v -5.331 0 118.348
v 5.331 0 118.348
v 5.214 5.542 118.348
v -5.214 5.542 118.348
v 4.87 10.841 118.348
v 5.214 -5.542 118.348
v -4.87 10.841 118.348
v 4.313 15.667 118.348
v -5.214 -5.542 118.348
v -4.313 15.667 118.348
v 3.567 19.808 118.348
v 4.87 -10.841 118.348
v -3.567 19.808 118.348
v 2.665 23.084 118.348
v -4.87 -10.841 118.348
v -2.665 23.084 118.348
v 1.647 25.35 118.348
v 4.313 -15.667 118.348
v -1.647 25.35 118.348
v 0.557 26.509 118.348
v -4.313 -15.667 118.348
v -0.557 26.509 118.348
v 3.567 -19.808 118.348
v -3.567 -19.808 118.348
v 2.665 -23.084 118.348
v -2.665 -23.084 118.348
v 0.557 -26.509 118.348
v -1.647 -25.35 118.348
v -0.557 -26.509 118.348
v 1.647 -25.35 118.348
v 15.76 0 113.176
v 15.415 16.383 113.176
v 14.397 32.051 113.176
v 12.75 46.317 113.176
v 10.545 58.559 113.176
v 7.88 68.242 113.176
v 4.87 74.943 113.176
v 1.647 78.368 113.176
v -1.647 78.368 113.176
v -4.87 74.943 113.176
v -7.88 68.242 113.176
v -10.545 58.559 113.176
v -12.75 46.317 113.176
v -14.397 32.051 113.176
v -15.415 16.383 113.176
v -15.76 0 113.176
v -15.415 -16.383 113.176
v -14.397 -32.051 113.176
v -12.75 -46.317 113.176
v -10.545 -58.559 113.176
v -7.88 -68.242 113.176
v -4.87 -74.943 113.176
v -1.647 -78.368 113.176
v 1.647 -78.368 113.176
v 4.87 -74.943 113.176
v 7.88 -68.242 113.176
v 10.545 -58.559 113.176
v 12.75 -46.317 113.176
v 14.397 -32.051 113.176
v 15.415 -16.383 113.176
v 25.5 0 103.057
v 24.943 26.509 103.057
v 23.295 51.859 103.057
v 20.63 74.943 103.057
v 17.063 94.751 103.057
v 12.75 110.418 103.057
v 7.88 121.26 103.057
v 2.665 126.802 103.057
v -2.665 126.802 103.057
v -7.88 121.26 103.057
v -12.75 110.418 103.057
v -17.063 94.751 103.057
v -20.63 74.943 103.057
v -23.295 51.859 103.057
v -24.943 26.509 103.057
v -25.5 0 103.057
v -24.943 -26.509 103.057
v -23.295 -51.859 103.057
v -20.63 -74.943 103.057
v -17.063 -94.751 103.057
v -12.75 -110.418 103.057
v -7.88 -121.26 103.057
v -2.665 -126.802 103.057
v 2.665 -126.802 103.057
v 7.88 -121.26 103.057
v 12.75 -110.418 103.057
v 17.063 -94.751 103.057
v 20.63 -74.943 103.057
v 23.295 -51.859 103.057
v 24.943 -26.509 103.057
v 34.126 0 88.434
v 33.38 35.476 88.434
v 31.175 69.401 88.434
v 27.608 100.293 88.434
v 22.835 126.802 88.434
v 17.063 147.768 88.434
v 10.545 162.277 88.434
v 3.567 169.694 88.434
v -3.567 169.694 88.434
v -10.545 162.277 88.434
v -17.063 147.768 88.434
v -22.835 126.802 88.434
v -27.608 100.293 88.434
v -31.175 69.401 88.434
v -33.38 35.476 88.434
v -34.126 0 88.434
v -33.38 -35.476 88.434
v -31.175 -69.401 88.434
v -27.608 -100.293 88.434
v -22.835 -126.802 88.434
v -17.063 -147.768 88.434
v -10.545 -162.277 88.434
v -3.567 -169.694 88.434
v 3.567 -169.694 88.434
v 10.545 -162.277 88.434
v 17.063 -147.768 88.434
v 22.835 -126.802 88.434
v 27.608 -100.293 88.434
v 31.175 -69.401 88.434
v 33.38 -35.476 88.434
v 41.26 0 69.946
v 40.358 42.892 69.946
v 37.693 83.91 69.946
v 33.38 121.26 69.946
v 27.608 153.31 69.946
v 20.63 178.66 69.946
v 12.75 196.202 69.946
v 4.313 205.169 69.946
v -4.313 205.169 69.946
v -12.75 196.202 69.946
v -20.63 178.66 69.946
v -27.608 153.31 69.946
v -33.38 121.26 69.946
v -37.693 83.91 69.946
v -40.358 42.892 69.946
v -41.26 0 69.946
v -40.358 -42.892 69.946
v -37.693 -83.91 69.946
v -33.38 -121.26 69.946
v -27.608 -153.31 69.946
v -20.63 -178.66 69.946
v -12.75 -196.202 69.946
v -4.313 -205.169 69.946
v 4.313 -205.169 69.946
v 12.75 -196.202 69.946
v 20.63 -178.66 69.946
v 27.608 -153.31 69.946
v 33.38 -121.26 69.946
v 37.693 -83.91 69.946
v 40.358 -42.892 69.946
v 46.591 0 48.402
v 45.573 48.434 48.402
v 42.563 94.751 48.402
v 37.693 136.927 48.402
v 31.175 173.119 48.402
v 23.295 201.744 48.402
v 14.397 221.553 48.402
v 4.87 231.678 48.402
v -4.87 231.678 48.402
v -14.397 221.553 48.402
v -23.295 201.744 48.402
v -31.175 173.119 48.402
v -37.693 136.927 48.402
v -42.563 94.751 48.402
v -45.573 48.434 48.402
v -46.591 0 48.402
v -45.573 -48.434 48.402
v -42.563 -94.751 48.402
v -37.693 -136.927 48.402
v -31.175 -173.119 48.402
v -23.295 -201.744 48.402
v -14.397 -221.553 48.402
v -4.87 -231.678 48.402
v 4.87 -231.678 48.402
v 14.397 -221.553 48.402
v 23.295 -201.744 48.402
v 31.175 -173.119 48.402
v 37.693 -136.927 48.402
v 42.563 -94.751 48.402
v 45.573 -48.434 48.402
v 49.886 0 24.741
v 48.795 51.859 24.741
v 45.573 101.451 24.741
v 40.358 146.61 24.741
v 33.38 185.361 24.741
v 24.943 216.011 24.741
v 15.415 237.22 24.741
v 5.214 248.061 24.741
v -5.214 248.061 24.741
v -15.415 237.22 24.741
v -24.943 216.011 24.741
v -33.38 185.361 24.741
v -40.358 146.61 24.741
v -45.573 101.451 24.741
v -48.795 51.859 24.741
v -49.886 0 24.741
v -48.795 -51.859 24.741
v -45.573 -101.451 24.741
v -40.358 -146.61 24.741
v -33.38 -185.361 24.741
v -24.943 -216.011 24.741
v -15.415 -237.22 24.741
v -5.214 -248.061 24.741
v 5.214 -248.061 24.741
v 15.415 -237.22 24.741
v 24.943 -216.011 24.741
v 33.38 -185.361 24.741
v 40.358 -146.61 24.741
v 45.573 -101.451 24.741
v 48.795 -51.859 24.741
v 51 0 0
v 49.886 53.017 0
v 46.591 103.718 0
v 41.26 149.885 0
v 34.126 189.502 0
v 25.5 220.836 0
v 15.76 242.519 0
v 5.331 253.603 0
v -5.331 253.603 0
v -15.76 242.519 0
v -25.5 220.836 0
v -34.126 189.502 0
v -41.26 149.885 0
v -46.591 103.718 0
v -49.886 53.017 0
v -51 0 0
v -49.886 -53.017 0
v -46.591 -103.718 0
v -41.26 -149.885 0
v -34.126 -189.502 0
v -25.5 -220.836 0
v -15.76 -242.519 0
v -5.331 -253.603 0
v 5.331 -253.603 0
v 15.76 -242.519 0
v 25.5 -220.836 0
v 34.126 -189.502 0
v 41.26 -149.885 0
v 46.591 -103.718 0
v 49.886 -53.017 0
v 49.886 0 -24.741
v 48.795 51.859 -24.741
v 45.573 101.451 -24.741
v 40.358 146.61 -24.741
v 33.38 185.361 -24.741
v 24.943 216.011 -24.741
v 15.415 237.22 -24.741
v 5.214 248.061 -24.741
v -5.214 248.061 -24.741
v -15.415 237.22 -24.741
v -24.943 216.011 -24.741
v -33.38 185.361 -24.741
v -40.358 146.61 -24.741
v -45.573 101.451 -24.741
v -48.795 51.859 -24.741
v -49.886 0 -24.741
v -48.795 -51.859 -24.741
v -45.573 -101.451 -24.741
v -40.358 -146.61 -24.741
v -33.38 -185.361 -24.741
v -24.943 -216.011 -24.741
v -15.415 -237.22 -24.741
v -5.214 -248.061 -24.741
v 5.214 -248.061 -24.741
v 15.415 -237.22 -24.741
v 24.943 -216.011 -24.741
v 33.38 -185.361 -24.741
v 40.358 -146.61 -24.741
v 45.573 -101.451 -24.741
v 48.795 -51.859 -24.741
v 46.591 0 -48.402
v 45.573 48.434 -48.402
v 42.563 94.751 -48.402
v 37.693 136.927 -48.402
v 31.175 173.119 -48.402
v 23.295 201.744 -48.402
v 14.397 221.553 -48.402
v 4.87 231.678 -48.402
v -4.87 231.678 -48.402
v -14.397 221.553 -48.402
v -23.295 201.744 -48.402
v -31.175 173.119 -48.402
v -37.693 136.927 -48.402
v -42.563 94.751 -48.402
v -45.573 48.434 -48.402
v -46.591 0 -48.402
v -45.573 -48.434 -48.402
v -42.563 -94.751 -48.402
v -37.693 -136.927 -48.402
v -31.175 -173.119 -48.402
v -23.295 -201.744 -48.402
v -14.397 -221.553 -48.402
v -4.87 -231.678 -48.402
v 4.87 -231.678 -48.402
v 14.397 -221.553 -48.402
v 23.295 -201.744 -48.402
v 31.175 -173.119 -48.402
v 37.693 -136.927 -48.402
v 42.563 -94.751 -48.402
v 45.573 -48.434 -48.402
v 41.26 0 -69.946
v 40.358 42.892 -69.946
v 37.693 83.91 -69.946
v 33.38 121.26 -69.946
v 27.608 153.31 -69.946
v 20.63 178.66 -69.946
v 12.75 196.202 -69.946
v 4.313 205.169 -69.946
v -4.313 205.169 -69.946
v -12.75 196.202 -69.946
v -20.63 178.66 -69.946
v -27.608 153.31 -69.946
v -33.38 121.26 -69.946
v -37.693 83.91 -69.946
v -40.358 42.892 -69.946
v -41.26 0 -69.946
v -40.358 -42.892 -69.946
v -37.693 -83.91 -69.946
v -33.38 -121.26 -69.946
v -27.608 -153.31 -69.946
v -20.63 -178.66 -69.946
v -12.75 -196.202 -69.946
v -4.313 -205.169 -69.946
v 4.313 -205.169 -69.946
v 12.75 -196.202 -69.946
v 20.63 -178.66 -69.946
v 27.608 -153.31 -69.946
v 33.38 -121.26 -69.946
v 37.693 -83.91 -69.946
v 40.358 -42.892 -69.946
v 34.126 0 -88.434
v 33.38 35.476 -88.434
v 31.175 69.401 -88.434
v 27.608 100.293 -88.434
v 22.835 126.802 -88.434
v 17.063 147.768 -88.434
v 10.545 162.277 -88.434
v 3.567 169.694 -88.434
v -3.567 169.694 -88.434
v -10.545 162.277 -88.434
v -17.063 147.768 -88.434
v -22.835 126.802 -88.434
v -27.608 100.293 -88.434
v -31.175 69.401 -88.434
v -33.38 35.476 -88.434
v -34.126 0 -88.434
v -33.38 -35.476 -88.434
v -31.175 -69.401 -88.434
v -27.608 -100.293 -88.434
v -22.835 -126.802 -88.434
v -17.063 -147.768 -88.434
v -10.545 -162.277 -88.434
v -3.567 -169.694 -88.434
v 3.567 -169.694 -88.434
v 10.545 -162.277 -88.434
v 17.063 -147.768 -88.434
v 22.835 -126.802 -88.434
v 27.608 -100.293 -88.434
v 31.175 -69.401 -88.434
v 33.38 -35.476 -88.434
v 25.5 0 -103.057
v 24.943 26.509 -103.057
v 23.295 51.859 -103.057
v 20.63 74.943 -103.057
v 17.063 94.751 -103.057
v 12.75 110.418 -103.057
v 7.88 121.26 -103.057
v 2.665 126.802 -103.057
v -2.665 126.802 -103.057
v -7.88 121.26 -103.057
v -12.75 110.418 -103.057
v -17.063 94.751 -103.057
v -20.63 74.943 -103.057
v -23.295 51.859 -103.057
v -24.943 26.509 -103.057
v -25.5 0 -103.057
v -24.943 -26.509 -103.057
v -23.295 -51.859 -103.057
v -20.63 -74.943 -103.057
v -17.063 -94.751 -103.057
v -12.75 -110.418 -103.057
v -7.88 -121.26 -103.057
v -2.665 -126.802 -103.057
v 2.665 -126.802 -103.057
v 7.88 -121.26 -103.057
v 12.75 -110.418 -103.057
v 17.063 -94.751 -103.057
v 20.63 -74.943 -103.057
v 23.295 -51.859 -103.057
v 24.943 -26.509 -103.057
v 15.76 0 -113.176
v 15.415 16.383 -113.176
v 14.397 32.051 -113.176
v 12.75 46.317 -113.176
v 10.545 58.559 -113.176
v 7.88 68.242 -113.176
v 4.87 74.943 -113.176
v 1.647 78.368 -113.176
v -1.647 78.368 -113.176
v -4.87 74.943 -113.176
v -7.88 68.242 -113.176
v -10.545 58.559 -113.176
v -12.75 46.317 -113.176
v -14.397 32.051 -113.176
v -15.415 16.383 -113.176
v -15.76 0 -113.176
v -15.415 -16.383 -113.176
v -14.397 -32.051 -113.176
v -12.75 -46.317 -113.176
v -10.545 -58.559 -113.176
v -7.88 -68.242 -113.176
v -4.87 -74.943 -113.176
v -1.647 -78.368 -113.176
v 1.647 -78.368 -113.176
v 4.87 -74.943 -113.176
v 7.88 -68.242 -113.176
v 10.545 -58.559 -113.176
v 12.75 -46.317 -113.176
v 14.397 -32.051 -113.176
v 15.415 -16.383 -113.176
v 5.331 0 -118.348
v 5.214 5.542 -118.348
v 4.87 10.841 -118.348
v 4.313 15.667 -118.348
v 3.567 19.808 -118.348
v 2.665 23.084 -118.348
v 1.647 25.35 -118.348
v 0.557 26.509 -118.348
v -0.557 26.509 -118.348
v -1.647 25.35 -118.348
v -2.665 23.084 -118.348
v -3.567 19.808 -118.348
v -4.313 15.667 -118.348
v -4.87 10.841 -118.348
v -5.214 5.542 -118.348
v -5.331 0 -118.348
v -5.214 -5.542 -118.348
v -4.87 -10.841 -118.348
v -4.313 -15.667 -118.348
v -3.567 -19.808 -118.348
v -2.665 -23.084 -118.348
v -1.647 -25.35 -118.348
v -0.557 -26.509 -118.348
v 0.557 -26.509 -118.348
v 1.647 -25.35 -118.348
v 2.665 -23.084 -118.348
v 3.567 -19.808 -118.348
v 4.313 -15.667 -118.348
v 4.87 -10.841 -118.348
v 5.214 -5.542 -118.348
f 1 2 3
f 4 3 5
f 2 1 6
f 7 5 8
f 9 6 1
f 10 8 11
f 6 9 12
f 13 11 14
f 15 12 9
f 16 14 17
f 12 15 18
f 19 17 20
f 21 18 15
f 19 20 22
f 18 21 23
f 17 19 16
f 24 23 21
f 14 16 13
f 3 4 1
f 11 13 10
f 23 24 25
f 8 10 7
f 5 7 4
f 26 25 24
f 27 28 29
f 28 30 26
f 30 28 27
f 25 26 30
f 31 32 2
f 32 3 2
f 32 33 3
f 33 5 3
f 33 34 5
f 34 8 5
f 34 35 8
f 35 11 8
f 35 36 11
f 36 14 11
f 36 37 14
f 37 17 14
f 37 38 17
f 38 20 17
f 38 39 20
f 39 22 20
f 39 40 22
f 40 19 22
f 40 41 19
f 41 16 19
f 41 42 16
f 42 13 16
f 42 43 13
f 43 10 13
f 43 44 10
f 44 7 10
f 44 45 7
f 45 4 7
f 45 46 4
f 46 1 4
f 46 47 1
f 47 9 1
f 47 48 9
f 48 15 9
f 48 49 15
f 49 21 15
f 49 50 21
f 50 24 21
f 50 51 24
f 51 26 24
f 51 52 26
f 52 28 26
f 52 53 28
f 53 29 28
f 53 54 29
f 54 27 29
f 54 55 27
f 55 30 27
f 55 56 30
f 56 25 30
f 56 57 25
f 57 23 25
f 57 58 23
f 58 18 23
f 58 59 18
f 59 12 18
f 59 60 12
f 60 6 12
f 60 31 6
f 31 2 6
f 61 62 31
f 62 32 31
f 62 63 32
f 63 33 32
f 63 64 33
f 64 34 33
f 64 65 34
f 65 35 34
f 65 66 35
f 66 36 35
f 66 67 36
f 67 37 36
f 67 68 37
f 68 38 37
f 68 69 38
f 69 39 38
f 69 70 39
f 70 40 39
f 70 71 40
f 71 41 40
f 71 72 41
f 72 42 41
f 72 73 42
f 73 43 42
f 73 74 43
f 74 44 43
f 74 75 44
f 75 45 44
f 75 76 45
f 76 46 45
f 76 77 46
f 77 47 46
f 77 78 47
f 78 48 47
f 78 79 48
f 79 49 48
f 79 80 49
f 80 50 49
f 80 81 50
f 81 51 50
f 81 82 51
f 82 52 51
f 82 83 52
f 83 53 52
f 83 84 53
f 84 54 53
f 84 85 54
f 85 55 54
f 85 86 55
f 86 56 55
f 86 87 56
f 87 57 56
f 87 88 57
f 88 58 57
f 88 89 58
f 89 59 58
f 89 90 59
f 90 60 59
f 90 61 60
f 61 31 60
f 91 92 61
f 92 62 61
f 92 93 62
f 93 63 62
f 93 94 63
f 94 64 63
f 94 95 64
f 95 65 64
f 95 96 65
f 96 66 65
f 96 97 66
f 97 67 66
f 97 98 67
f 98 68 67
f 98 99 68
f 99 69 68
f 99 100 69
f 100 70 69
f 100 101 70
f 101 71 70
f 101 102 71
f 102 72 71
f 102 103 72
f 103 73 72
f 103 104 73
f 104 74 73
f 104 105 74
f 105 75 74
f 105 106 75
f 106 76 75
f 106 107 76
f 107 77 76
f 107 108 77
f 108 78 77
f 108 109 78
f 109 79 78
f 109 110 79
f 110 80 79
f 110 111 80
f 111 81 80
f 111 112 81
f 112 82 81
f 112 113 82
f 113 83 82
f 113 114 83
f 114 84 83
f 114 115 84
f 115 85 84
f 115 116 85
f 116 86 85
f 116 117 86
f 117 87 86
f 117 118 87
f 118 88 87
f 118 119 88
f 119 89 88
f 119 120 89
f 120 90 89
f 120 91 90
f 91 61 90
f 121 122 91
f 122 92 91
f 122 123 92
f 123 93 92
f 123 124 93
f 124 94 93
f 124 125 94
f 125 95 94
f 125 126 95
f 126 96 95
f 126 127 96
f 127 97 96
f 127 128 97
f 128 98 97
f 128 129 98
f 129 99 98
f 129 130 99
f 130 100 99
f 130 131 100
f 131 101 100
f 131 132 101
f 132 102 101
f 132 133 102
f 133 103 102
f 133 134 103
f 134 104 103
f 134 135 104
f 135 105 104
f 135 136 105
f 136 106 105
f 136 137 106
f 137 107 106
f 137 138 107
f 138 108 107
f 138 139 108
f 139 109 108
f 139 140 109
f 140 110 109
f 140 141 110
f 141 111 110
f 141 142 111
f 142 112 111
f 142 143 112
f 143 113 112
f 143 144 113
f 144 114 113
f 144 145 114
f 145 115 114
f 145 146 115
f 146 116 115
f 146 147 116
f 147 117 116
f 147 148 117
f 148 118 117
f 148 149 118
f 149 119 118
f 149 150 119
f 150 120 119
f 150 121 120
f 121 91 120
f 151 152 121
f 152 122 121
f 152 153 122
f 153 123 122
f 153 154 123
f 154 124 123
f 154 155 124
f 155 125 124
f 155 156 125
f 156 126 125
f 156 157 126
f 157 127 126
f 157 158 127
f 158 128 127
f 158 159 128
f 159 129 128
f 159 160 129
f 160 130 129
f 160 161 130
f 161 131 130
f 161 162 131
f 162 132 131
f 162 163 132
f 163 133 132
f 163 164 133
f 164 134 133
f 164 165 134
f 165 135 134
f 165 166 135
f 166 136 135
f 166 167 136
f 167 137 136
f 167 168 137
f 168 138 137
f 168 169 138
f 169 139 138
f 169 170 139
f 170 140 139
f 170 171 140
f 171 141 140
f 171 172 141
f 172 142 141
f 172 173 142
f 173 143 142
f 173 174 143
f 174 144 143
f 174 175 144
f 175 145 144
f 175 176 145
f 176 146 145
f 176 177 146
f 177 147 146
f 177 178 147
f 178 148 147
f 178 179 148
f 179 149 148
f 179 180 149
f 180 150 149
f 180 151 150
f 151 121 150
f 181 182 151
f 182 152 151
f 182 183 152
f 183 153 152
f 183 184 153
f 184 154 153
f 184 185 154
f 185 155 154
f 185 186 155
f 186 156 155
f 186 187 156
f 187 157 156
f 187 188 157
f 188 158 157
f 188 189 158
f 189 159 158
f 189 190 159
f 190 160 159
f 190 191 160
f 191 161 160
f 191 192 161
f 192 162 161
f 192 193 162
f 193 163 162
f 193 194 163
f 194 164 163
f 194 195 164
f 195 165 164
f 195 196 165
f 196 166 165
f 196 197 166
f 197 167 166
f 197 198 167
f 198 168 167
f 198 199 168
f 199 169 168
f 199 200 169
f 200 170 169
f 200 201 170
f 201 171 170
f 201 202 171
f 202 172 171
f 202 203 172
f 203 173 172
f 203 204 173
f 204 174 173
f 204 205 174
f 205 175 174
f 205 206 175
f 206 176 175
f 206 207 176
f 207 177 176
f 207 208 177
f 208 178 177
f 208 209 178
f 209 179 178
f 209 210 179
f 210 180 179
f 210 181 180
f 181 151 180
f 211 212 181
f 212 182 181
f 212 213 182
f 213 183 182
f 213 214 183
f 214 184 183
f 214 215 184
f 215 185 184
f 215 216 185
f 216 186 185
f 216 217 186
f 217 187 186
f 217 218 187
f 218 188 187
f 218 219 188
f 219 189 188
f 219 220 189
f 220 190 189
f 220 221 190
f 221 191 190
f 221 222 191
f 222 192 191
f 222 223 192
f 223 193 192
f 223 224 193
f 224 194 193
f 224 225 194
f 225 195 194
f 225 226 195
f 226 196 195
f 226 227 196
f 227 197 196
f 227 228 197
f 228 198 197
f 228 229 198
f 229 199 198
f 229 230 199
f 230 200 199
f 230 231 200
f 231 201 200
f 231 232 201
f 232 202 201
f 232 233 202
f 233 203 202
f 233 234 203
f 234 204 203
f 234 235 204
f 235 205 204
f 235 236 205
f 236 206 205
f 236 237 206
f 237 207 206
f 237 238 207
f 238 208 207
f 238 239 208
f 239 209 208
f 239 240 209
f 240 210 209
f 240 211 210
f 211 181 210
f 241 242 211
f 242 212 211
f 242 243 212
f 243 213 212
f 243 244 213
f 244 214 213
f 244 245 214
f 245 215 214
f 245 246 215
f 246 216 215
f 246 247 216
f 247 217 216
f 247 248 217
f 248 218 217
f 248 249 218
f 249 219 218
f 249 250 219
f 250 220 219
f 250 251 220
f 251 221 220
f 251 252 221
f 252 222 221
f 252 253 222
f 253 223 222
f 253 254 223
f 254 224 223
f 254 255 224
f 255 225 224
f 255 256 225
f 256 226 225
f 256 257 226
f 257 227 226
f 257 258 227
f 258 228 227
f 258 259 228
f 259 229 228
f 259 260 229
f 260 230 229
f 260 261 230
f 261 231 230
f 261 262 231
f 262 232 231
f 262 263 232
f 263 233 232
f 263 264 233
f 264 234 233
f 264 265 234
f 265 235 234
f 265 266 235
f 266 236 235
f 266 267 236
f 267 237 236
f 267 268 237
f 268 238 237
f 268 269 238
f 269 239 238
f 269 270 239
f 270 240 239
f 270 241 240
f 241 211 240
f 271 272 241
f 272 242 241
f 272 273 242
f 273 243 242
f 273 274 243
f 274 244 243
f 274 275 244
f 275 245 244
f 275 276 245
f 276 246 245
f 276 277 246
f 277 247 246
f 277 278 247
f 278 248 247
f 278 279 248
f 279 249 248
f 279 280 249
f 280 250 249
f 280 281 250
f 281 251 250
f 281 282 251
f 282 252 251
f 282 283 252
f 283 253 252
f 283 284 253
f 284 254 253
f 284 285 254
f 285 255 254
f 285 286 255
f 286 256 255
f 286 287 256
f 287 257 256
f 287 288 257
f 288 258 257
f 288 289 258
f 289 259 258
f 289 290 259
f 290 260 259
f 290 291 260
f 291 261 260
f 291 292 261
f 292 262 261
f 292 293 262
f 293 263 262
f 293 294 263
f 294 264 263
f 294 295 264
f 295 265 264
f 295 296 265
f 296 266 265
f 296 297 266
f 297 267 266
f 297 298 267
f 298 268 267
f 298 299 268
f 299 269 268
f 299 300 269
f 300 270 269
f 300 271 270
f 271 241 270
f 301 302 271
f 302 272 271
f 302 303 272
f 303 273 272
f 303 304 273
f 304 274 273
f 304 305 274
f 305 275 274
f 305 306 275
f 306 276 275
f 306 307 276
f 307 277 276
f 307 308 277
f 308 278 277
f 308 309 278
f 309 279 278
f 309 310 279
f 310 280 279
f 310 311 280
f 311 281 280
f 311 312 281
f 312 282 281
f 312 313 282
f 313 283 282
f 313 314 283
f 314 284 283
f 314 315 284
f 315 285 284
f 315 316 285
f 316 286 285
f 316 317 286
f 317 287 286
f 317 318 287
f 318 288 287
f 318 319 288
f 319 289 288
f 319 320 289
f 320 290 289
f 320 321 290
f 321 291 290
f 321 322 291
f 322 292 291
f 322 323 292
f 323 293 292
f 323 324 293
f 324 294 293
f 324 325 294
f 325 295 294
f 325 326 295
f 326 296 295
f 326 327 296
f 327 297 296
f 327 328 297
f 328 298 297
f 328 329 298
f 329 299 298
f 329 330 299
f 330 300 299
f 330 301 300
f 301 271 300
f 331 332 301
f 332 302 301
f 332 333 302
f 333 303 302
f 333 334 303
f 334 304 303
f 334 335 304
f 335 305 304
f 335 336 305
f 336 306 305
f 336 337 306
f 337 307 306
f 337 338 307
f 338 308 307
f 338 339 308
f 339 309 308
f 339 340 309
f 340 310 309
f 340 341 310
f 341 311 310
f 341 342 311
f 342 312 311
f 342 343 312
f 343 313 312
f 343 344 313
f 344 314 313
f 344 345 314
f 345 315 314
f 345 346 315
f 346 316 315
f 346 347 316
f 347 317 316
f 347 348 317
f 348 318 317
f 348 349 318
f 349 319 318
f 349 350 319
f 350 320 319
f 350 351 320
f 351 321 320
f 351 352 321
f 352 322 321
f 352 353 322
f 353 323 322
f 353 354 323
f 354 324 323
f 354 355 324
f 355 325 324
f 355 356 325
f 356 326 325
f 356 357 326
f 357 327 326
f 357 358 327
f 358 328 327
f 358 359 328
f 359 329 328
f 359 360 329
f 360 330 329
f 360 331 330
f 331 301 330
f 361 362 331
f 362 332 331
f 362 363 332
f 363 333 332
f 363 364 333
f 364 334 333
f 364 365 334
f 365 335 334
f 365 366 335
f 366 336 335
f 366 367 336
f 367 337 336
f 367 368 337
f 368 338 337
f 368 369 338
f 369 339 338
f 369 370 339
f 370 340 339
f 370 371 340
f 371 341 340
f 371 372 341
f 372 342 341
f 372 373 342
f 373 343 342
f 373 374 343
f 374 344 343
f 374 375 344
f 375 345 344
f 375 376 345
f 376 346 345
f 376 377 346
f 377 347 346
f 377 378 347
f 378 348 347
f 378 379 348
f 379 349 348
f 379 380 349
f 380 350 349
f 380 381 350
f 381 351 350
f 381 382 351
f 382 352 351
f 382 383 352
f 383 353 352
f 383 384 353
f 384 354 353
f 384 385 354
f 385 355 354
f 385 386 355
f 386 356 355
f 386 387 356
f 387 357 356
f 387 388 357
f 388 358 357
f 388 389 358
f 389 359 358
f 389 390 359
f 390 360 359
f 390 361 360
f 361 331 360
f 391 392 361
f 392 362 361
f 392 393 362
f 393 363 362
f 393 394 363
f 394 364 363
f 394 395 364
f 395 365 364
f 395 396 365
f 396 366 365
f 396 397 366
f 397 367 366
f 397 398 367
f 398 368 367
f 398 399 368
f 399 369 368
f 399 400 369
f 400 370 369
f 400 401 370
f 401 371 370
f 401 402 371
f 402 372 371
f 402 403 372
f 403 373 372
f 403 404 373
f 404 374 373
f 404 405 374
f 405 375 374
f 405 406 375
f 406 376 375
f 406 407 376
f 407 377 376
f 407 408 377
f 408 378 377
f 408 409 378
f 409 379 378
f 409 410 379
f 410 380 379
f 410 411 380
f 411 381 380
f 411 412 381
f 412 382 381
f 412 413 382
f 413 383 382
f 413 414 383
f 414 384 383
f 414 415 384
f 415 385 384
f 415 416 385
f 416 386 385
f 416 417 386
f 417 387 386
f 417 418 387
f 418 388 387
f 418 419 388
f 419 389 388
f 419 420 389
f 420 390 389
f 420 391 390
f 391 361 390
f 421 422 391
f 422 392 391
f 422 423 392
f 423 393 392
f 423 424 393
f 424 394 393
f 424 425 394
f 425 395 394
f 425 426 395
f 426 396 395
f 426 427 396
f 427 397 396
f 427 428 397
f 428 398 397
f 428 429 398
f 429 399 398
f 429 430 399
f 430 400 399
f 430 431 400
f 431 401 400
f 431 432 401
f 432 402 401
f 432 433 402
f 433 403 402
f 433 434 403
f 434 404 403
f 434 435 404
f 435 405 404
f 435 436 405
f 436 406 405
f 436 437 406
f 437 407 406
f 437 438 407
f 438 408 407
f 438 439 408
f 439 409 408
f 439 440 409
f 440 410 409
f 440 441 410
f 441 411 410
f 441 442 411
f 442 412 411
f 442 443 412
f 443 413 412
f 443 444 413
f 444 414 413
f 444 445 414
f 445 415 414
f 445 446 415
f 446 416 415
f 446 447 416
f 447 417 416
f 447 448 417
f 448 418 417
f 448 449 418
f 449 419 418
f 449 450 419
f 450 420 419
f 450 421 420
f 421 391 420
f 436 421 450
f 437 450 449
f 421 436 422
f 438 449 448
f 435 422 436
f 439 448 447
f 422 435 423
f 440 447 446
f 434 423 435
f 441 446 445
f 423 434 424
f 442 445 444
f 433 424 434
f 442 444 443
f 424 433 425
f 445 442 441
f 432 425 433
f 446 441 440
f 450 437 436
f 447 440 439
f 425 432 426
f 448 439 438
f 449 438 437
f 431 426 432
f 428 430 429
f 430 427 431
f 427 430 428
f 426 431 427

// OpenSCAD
// Generated by SolidPython 1.0.1 on 2020-07-29 00:46:45


scale(v = [3, 15, 7]) {
	sphere(r = 17);
}
/***********************************************
*********      SolidPython code:      **********
************************************************
 
# import packages: SolidPython
from solid import *
from solid.utils import *
from itertools import chain, combinations, permutations


class Resize:

    def __init__(self, scad_file):
        self.scad_file = scad_file
        #self.scad_file = import_scad(scad_file)
        # cone/cylinder param:
        self.r1 = 0
        self.r2 = 0
        self.h = 0
        # rectangular prism param:
        self.w = 0
        self.l = 0
        # ellipse param:
        self.r = 0

    # import OpenScad code (file name corresponds to shape)


    # classify shape + parameters
    def assign(self, param1, param2, param3):
        if self.scad_file == 'cone.scad':
            self.r1 = param1
            self.r2 = param2
            self.h = param3
        elif self.scad_file == 'cylinder.scad':
            self.r1 = param1
            self.r2 = param2
            self.h = param3
        elif self.scad_file == 'rectangularPrism.scad':
            self.h = param1
            self.l = param2
            self.w = param3
        else:
            self.r = param1
            self.h = param2

    # resize parameters
    def iterate(self):
        x = range(3, 20, 2)
        i = 1
        if self.scad_file == 'cone.scad':
            tempList = list(permutations(x, 2))
            for temp in tempList:
                param1 = temp[0]
                param2 = temp[1]
                filepath = 'produced_scad_files/' + 'cone' + str(param1) + '_' + str(param2) + '_' + '.scad'
                scad_render_to_file(cylinder(h=param1, r1=param2, r2=0), filepath)

        elif self.scad_file == 'cylinder.scad':
            tempList = list(permutations(x, 3))
            for temp in tempList:
                param1 = temp[0]
                param2 = temp[1]
                filepath = 'produced_scad_files/' + 'cylinder' + str(param1) + '_' + str(param2) + '_' + '.scad'
                scad_render_to_file(cylinder(h=param1, r1=param2, r2=param2), filepath)

        elif self.scad_file == 'rectangularPrism.scad':
            tempList = list(permutations(x, 3))
            for temp in tempList:
                param1 = temp[0]
                param2 = temp[1]
                param3 = temp[2]
                filepath = 'produced_scad_files/' + 'rectangularPrism' + str(param1) + '_' + str(param2) + '_' + str(
                    param3) + '.scad'
                scad_render_to_file(cube(size=(param1, param2, param3)), filepath)

        elif self.scad_file == 'ellipse.scad':
            tempList = list(permutations(x, 4))
            for temp in tempList:
                param1 = temp[0]
                param2 = temp[1]
                param3 = temp[2]
                param4 = temp[3]
                filepath = 'produced_scad_files/' + 'ellipse' + str(param1) + '_' + str(param2) + '_' + str(param3) + '_' + str(param4) + '.scad'
                scad_render_to_file(scale([param1, param2, param3])(sphere(r=param4)), filepath)

    def render_to_scadfile(self):
        scad_render_to_file(scad, 'example.scad') 
 
************************************************/
